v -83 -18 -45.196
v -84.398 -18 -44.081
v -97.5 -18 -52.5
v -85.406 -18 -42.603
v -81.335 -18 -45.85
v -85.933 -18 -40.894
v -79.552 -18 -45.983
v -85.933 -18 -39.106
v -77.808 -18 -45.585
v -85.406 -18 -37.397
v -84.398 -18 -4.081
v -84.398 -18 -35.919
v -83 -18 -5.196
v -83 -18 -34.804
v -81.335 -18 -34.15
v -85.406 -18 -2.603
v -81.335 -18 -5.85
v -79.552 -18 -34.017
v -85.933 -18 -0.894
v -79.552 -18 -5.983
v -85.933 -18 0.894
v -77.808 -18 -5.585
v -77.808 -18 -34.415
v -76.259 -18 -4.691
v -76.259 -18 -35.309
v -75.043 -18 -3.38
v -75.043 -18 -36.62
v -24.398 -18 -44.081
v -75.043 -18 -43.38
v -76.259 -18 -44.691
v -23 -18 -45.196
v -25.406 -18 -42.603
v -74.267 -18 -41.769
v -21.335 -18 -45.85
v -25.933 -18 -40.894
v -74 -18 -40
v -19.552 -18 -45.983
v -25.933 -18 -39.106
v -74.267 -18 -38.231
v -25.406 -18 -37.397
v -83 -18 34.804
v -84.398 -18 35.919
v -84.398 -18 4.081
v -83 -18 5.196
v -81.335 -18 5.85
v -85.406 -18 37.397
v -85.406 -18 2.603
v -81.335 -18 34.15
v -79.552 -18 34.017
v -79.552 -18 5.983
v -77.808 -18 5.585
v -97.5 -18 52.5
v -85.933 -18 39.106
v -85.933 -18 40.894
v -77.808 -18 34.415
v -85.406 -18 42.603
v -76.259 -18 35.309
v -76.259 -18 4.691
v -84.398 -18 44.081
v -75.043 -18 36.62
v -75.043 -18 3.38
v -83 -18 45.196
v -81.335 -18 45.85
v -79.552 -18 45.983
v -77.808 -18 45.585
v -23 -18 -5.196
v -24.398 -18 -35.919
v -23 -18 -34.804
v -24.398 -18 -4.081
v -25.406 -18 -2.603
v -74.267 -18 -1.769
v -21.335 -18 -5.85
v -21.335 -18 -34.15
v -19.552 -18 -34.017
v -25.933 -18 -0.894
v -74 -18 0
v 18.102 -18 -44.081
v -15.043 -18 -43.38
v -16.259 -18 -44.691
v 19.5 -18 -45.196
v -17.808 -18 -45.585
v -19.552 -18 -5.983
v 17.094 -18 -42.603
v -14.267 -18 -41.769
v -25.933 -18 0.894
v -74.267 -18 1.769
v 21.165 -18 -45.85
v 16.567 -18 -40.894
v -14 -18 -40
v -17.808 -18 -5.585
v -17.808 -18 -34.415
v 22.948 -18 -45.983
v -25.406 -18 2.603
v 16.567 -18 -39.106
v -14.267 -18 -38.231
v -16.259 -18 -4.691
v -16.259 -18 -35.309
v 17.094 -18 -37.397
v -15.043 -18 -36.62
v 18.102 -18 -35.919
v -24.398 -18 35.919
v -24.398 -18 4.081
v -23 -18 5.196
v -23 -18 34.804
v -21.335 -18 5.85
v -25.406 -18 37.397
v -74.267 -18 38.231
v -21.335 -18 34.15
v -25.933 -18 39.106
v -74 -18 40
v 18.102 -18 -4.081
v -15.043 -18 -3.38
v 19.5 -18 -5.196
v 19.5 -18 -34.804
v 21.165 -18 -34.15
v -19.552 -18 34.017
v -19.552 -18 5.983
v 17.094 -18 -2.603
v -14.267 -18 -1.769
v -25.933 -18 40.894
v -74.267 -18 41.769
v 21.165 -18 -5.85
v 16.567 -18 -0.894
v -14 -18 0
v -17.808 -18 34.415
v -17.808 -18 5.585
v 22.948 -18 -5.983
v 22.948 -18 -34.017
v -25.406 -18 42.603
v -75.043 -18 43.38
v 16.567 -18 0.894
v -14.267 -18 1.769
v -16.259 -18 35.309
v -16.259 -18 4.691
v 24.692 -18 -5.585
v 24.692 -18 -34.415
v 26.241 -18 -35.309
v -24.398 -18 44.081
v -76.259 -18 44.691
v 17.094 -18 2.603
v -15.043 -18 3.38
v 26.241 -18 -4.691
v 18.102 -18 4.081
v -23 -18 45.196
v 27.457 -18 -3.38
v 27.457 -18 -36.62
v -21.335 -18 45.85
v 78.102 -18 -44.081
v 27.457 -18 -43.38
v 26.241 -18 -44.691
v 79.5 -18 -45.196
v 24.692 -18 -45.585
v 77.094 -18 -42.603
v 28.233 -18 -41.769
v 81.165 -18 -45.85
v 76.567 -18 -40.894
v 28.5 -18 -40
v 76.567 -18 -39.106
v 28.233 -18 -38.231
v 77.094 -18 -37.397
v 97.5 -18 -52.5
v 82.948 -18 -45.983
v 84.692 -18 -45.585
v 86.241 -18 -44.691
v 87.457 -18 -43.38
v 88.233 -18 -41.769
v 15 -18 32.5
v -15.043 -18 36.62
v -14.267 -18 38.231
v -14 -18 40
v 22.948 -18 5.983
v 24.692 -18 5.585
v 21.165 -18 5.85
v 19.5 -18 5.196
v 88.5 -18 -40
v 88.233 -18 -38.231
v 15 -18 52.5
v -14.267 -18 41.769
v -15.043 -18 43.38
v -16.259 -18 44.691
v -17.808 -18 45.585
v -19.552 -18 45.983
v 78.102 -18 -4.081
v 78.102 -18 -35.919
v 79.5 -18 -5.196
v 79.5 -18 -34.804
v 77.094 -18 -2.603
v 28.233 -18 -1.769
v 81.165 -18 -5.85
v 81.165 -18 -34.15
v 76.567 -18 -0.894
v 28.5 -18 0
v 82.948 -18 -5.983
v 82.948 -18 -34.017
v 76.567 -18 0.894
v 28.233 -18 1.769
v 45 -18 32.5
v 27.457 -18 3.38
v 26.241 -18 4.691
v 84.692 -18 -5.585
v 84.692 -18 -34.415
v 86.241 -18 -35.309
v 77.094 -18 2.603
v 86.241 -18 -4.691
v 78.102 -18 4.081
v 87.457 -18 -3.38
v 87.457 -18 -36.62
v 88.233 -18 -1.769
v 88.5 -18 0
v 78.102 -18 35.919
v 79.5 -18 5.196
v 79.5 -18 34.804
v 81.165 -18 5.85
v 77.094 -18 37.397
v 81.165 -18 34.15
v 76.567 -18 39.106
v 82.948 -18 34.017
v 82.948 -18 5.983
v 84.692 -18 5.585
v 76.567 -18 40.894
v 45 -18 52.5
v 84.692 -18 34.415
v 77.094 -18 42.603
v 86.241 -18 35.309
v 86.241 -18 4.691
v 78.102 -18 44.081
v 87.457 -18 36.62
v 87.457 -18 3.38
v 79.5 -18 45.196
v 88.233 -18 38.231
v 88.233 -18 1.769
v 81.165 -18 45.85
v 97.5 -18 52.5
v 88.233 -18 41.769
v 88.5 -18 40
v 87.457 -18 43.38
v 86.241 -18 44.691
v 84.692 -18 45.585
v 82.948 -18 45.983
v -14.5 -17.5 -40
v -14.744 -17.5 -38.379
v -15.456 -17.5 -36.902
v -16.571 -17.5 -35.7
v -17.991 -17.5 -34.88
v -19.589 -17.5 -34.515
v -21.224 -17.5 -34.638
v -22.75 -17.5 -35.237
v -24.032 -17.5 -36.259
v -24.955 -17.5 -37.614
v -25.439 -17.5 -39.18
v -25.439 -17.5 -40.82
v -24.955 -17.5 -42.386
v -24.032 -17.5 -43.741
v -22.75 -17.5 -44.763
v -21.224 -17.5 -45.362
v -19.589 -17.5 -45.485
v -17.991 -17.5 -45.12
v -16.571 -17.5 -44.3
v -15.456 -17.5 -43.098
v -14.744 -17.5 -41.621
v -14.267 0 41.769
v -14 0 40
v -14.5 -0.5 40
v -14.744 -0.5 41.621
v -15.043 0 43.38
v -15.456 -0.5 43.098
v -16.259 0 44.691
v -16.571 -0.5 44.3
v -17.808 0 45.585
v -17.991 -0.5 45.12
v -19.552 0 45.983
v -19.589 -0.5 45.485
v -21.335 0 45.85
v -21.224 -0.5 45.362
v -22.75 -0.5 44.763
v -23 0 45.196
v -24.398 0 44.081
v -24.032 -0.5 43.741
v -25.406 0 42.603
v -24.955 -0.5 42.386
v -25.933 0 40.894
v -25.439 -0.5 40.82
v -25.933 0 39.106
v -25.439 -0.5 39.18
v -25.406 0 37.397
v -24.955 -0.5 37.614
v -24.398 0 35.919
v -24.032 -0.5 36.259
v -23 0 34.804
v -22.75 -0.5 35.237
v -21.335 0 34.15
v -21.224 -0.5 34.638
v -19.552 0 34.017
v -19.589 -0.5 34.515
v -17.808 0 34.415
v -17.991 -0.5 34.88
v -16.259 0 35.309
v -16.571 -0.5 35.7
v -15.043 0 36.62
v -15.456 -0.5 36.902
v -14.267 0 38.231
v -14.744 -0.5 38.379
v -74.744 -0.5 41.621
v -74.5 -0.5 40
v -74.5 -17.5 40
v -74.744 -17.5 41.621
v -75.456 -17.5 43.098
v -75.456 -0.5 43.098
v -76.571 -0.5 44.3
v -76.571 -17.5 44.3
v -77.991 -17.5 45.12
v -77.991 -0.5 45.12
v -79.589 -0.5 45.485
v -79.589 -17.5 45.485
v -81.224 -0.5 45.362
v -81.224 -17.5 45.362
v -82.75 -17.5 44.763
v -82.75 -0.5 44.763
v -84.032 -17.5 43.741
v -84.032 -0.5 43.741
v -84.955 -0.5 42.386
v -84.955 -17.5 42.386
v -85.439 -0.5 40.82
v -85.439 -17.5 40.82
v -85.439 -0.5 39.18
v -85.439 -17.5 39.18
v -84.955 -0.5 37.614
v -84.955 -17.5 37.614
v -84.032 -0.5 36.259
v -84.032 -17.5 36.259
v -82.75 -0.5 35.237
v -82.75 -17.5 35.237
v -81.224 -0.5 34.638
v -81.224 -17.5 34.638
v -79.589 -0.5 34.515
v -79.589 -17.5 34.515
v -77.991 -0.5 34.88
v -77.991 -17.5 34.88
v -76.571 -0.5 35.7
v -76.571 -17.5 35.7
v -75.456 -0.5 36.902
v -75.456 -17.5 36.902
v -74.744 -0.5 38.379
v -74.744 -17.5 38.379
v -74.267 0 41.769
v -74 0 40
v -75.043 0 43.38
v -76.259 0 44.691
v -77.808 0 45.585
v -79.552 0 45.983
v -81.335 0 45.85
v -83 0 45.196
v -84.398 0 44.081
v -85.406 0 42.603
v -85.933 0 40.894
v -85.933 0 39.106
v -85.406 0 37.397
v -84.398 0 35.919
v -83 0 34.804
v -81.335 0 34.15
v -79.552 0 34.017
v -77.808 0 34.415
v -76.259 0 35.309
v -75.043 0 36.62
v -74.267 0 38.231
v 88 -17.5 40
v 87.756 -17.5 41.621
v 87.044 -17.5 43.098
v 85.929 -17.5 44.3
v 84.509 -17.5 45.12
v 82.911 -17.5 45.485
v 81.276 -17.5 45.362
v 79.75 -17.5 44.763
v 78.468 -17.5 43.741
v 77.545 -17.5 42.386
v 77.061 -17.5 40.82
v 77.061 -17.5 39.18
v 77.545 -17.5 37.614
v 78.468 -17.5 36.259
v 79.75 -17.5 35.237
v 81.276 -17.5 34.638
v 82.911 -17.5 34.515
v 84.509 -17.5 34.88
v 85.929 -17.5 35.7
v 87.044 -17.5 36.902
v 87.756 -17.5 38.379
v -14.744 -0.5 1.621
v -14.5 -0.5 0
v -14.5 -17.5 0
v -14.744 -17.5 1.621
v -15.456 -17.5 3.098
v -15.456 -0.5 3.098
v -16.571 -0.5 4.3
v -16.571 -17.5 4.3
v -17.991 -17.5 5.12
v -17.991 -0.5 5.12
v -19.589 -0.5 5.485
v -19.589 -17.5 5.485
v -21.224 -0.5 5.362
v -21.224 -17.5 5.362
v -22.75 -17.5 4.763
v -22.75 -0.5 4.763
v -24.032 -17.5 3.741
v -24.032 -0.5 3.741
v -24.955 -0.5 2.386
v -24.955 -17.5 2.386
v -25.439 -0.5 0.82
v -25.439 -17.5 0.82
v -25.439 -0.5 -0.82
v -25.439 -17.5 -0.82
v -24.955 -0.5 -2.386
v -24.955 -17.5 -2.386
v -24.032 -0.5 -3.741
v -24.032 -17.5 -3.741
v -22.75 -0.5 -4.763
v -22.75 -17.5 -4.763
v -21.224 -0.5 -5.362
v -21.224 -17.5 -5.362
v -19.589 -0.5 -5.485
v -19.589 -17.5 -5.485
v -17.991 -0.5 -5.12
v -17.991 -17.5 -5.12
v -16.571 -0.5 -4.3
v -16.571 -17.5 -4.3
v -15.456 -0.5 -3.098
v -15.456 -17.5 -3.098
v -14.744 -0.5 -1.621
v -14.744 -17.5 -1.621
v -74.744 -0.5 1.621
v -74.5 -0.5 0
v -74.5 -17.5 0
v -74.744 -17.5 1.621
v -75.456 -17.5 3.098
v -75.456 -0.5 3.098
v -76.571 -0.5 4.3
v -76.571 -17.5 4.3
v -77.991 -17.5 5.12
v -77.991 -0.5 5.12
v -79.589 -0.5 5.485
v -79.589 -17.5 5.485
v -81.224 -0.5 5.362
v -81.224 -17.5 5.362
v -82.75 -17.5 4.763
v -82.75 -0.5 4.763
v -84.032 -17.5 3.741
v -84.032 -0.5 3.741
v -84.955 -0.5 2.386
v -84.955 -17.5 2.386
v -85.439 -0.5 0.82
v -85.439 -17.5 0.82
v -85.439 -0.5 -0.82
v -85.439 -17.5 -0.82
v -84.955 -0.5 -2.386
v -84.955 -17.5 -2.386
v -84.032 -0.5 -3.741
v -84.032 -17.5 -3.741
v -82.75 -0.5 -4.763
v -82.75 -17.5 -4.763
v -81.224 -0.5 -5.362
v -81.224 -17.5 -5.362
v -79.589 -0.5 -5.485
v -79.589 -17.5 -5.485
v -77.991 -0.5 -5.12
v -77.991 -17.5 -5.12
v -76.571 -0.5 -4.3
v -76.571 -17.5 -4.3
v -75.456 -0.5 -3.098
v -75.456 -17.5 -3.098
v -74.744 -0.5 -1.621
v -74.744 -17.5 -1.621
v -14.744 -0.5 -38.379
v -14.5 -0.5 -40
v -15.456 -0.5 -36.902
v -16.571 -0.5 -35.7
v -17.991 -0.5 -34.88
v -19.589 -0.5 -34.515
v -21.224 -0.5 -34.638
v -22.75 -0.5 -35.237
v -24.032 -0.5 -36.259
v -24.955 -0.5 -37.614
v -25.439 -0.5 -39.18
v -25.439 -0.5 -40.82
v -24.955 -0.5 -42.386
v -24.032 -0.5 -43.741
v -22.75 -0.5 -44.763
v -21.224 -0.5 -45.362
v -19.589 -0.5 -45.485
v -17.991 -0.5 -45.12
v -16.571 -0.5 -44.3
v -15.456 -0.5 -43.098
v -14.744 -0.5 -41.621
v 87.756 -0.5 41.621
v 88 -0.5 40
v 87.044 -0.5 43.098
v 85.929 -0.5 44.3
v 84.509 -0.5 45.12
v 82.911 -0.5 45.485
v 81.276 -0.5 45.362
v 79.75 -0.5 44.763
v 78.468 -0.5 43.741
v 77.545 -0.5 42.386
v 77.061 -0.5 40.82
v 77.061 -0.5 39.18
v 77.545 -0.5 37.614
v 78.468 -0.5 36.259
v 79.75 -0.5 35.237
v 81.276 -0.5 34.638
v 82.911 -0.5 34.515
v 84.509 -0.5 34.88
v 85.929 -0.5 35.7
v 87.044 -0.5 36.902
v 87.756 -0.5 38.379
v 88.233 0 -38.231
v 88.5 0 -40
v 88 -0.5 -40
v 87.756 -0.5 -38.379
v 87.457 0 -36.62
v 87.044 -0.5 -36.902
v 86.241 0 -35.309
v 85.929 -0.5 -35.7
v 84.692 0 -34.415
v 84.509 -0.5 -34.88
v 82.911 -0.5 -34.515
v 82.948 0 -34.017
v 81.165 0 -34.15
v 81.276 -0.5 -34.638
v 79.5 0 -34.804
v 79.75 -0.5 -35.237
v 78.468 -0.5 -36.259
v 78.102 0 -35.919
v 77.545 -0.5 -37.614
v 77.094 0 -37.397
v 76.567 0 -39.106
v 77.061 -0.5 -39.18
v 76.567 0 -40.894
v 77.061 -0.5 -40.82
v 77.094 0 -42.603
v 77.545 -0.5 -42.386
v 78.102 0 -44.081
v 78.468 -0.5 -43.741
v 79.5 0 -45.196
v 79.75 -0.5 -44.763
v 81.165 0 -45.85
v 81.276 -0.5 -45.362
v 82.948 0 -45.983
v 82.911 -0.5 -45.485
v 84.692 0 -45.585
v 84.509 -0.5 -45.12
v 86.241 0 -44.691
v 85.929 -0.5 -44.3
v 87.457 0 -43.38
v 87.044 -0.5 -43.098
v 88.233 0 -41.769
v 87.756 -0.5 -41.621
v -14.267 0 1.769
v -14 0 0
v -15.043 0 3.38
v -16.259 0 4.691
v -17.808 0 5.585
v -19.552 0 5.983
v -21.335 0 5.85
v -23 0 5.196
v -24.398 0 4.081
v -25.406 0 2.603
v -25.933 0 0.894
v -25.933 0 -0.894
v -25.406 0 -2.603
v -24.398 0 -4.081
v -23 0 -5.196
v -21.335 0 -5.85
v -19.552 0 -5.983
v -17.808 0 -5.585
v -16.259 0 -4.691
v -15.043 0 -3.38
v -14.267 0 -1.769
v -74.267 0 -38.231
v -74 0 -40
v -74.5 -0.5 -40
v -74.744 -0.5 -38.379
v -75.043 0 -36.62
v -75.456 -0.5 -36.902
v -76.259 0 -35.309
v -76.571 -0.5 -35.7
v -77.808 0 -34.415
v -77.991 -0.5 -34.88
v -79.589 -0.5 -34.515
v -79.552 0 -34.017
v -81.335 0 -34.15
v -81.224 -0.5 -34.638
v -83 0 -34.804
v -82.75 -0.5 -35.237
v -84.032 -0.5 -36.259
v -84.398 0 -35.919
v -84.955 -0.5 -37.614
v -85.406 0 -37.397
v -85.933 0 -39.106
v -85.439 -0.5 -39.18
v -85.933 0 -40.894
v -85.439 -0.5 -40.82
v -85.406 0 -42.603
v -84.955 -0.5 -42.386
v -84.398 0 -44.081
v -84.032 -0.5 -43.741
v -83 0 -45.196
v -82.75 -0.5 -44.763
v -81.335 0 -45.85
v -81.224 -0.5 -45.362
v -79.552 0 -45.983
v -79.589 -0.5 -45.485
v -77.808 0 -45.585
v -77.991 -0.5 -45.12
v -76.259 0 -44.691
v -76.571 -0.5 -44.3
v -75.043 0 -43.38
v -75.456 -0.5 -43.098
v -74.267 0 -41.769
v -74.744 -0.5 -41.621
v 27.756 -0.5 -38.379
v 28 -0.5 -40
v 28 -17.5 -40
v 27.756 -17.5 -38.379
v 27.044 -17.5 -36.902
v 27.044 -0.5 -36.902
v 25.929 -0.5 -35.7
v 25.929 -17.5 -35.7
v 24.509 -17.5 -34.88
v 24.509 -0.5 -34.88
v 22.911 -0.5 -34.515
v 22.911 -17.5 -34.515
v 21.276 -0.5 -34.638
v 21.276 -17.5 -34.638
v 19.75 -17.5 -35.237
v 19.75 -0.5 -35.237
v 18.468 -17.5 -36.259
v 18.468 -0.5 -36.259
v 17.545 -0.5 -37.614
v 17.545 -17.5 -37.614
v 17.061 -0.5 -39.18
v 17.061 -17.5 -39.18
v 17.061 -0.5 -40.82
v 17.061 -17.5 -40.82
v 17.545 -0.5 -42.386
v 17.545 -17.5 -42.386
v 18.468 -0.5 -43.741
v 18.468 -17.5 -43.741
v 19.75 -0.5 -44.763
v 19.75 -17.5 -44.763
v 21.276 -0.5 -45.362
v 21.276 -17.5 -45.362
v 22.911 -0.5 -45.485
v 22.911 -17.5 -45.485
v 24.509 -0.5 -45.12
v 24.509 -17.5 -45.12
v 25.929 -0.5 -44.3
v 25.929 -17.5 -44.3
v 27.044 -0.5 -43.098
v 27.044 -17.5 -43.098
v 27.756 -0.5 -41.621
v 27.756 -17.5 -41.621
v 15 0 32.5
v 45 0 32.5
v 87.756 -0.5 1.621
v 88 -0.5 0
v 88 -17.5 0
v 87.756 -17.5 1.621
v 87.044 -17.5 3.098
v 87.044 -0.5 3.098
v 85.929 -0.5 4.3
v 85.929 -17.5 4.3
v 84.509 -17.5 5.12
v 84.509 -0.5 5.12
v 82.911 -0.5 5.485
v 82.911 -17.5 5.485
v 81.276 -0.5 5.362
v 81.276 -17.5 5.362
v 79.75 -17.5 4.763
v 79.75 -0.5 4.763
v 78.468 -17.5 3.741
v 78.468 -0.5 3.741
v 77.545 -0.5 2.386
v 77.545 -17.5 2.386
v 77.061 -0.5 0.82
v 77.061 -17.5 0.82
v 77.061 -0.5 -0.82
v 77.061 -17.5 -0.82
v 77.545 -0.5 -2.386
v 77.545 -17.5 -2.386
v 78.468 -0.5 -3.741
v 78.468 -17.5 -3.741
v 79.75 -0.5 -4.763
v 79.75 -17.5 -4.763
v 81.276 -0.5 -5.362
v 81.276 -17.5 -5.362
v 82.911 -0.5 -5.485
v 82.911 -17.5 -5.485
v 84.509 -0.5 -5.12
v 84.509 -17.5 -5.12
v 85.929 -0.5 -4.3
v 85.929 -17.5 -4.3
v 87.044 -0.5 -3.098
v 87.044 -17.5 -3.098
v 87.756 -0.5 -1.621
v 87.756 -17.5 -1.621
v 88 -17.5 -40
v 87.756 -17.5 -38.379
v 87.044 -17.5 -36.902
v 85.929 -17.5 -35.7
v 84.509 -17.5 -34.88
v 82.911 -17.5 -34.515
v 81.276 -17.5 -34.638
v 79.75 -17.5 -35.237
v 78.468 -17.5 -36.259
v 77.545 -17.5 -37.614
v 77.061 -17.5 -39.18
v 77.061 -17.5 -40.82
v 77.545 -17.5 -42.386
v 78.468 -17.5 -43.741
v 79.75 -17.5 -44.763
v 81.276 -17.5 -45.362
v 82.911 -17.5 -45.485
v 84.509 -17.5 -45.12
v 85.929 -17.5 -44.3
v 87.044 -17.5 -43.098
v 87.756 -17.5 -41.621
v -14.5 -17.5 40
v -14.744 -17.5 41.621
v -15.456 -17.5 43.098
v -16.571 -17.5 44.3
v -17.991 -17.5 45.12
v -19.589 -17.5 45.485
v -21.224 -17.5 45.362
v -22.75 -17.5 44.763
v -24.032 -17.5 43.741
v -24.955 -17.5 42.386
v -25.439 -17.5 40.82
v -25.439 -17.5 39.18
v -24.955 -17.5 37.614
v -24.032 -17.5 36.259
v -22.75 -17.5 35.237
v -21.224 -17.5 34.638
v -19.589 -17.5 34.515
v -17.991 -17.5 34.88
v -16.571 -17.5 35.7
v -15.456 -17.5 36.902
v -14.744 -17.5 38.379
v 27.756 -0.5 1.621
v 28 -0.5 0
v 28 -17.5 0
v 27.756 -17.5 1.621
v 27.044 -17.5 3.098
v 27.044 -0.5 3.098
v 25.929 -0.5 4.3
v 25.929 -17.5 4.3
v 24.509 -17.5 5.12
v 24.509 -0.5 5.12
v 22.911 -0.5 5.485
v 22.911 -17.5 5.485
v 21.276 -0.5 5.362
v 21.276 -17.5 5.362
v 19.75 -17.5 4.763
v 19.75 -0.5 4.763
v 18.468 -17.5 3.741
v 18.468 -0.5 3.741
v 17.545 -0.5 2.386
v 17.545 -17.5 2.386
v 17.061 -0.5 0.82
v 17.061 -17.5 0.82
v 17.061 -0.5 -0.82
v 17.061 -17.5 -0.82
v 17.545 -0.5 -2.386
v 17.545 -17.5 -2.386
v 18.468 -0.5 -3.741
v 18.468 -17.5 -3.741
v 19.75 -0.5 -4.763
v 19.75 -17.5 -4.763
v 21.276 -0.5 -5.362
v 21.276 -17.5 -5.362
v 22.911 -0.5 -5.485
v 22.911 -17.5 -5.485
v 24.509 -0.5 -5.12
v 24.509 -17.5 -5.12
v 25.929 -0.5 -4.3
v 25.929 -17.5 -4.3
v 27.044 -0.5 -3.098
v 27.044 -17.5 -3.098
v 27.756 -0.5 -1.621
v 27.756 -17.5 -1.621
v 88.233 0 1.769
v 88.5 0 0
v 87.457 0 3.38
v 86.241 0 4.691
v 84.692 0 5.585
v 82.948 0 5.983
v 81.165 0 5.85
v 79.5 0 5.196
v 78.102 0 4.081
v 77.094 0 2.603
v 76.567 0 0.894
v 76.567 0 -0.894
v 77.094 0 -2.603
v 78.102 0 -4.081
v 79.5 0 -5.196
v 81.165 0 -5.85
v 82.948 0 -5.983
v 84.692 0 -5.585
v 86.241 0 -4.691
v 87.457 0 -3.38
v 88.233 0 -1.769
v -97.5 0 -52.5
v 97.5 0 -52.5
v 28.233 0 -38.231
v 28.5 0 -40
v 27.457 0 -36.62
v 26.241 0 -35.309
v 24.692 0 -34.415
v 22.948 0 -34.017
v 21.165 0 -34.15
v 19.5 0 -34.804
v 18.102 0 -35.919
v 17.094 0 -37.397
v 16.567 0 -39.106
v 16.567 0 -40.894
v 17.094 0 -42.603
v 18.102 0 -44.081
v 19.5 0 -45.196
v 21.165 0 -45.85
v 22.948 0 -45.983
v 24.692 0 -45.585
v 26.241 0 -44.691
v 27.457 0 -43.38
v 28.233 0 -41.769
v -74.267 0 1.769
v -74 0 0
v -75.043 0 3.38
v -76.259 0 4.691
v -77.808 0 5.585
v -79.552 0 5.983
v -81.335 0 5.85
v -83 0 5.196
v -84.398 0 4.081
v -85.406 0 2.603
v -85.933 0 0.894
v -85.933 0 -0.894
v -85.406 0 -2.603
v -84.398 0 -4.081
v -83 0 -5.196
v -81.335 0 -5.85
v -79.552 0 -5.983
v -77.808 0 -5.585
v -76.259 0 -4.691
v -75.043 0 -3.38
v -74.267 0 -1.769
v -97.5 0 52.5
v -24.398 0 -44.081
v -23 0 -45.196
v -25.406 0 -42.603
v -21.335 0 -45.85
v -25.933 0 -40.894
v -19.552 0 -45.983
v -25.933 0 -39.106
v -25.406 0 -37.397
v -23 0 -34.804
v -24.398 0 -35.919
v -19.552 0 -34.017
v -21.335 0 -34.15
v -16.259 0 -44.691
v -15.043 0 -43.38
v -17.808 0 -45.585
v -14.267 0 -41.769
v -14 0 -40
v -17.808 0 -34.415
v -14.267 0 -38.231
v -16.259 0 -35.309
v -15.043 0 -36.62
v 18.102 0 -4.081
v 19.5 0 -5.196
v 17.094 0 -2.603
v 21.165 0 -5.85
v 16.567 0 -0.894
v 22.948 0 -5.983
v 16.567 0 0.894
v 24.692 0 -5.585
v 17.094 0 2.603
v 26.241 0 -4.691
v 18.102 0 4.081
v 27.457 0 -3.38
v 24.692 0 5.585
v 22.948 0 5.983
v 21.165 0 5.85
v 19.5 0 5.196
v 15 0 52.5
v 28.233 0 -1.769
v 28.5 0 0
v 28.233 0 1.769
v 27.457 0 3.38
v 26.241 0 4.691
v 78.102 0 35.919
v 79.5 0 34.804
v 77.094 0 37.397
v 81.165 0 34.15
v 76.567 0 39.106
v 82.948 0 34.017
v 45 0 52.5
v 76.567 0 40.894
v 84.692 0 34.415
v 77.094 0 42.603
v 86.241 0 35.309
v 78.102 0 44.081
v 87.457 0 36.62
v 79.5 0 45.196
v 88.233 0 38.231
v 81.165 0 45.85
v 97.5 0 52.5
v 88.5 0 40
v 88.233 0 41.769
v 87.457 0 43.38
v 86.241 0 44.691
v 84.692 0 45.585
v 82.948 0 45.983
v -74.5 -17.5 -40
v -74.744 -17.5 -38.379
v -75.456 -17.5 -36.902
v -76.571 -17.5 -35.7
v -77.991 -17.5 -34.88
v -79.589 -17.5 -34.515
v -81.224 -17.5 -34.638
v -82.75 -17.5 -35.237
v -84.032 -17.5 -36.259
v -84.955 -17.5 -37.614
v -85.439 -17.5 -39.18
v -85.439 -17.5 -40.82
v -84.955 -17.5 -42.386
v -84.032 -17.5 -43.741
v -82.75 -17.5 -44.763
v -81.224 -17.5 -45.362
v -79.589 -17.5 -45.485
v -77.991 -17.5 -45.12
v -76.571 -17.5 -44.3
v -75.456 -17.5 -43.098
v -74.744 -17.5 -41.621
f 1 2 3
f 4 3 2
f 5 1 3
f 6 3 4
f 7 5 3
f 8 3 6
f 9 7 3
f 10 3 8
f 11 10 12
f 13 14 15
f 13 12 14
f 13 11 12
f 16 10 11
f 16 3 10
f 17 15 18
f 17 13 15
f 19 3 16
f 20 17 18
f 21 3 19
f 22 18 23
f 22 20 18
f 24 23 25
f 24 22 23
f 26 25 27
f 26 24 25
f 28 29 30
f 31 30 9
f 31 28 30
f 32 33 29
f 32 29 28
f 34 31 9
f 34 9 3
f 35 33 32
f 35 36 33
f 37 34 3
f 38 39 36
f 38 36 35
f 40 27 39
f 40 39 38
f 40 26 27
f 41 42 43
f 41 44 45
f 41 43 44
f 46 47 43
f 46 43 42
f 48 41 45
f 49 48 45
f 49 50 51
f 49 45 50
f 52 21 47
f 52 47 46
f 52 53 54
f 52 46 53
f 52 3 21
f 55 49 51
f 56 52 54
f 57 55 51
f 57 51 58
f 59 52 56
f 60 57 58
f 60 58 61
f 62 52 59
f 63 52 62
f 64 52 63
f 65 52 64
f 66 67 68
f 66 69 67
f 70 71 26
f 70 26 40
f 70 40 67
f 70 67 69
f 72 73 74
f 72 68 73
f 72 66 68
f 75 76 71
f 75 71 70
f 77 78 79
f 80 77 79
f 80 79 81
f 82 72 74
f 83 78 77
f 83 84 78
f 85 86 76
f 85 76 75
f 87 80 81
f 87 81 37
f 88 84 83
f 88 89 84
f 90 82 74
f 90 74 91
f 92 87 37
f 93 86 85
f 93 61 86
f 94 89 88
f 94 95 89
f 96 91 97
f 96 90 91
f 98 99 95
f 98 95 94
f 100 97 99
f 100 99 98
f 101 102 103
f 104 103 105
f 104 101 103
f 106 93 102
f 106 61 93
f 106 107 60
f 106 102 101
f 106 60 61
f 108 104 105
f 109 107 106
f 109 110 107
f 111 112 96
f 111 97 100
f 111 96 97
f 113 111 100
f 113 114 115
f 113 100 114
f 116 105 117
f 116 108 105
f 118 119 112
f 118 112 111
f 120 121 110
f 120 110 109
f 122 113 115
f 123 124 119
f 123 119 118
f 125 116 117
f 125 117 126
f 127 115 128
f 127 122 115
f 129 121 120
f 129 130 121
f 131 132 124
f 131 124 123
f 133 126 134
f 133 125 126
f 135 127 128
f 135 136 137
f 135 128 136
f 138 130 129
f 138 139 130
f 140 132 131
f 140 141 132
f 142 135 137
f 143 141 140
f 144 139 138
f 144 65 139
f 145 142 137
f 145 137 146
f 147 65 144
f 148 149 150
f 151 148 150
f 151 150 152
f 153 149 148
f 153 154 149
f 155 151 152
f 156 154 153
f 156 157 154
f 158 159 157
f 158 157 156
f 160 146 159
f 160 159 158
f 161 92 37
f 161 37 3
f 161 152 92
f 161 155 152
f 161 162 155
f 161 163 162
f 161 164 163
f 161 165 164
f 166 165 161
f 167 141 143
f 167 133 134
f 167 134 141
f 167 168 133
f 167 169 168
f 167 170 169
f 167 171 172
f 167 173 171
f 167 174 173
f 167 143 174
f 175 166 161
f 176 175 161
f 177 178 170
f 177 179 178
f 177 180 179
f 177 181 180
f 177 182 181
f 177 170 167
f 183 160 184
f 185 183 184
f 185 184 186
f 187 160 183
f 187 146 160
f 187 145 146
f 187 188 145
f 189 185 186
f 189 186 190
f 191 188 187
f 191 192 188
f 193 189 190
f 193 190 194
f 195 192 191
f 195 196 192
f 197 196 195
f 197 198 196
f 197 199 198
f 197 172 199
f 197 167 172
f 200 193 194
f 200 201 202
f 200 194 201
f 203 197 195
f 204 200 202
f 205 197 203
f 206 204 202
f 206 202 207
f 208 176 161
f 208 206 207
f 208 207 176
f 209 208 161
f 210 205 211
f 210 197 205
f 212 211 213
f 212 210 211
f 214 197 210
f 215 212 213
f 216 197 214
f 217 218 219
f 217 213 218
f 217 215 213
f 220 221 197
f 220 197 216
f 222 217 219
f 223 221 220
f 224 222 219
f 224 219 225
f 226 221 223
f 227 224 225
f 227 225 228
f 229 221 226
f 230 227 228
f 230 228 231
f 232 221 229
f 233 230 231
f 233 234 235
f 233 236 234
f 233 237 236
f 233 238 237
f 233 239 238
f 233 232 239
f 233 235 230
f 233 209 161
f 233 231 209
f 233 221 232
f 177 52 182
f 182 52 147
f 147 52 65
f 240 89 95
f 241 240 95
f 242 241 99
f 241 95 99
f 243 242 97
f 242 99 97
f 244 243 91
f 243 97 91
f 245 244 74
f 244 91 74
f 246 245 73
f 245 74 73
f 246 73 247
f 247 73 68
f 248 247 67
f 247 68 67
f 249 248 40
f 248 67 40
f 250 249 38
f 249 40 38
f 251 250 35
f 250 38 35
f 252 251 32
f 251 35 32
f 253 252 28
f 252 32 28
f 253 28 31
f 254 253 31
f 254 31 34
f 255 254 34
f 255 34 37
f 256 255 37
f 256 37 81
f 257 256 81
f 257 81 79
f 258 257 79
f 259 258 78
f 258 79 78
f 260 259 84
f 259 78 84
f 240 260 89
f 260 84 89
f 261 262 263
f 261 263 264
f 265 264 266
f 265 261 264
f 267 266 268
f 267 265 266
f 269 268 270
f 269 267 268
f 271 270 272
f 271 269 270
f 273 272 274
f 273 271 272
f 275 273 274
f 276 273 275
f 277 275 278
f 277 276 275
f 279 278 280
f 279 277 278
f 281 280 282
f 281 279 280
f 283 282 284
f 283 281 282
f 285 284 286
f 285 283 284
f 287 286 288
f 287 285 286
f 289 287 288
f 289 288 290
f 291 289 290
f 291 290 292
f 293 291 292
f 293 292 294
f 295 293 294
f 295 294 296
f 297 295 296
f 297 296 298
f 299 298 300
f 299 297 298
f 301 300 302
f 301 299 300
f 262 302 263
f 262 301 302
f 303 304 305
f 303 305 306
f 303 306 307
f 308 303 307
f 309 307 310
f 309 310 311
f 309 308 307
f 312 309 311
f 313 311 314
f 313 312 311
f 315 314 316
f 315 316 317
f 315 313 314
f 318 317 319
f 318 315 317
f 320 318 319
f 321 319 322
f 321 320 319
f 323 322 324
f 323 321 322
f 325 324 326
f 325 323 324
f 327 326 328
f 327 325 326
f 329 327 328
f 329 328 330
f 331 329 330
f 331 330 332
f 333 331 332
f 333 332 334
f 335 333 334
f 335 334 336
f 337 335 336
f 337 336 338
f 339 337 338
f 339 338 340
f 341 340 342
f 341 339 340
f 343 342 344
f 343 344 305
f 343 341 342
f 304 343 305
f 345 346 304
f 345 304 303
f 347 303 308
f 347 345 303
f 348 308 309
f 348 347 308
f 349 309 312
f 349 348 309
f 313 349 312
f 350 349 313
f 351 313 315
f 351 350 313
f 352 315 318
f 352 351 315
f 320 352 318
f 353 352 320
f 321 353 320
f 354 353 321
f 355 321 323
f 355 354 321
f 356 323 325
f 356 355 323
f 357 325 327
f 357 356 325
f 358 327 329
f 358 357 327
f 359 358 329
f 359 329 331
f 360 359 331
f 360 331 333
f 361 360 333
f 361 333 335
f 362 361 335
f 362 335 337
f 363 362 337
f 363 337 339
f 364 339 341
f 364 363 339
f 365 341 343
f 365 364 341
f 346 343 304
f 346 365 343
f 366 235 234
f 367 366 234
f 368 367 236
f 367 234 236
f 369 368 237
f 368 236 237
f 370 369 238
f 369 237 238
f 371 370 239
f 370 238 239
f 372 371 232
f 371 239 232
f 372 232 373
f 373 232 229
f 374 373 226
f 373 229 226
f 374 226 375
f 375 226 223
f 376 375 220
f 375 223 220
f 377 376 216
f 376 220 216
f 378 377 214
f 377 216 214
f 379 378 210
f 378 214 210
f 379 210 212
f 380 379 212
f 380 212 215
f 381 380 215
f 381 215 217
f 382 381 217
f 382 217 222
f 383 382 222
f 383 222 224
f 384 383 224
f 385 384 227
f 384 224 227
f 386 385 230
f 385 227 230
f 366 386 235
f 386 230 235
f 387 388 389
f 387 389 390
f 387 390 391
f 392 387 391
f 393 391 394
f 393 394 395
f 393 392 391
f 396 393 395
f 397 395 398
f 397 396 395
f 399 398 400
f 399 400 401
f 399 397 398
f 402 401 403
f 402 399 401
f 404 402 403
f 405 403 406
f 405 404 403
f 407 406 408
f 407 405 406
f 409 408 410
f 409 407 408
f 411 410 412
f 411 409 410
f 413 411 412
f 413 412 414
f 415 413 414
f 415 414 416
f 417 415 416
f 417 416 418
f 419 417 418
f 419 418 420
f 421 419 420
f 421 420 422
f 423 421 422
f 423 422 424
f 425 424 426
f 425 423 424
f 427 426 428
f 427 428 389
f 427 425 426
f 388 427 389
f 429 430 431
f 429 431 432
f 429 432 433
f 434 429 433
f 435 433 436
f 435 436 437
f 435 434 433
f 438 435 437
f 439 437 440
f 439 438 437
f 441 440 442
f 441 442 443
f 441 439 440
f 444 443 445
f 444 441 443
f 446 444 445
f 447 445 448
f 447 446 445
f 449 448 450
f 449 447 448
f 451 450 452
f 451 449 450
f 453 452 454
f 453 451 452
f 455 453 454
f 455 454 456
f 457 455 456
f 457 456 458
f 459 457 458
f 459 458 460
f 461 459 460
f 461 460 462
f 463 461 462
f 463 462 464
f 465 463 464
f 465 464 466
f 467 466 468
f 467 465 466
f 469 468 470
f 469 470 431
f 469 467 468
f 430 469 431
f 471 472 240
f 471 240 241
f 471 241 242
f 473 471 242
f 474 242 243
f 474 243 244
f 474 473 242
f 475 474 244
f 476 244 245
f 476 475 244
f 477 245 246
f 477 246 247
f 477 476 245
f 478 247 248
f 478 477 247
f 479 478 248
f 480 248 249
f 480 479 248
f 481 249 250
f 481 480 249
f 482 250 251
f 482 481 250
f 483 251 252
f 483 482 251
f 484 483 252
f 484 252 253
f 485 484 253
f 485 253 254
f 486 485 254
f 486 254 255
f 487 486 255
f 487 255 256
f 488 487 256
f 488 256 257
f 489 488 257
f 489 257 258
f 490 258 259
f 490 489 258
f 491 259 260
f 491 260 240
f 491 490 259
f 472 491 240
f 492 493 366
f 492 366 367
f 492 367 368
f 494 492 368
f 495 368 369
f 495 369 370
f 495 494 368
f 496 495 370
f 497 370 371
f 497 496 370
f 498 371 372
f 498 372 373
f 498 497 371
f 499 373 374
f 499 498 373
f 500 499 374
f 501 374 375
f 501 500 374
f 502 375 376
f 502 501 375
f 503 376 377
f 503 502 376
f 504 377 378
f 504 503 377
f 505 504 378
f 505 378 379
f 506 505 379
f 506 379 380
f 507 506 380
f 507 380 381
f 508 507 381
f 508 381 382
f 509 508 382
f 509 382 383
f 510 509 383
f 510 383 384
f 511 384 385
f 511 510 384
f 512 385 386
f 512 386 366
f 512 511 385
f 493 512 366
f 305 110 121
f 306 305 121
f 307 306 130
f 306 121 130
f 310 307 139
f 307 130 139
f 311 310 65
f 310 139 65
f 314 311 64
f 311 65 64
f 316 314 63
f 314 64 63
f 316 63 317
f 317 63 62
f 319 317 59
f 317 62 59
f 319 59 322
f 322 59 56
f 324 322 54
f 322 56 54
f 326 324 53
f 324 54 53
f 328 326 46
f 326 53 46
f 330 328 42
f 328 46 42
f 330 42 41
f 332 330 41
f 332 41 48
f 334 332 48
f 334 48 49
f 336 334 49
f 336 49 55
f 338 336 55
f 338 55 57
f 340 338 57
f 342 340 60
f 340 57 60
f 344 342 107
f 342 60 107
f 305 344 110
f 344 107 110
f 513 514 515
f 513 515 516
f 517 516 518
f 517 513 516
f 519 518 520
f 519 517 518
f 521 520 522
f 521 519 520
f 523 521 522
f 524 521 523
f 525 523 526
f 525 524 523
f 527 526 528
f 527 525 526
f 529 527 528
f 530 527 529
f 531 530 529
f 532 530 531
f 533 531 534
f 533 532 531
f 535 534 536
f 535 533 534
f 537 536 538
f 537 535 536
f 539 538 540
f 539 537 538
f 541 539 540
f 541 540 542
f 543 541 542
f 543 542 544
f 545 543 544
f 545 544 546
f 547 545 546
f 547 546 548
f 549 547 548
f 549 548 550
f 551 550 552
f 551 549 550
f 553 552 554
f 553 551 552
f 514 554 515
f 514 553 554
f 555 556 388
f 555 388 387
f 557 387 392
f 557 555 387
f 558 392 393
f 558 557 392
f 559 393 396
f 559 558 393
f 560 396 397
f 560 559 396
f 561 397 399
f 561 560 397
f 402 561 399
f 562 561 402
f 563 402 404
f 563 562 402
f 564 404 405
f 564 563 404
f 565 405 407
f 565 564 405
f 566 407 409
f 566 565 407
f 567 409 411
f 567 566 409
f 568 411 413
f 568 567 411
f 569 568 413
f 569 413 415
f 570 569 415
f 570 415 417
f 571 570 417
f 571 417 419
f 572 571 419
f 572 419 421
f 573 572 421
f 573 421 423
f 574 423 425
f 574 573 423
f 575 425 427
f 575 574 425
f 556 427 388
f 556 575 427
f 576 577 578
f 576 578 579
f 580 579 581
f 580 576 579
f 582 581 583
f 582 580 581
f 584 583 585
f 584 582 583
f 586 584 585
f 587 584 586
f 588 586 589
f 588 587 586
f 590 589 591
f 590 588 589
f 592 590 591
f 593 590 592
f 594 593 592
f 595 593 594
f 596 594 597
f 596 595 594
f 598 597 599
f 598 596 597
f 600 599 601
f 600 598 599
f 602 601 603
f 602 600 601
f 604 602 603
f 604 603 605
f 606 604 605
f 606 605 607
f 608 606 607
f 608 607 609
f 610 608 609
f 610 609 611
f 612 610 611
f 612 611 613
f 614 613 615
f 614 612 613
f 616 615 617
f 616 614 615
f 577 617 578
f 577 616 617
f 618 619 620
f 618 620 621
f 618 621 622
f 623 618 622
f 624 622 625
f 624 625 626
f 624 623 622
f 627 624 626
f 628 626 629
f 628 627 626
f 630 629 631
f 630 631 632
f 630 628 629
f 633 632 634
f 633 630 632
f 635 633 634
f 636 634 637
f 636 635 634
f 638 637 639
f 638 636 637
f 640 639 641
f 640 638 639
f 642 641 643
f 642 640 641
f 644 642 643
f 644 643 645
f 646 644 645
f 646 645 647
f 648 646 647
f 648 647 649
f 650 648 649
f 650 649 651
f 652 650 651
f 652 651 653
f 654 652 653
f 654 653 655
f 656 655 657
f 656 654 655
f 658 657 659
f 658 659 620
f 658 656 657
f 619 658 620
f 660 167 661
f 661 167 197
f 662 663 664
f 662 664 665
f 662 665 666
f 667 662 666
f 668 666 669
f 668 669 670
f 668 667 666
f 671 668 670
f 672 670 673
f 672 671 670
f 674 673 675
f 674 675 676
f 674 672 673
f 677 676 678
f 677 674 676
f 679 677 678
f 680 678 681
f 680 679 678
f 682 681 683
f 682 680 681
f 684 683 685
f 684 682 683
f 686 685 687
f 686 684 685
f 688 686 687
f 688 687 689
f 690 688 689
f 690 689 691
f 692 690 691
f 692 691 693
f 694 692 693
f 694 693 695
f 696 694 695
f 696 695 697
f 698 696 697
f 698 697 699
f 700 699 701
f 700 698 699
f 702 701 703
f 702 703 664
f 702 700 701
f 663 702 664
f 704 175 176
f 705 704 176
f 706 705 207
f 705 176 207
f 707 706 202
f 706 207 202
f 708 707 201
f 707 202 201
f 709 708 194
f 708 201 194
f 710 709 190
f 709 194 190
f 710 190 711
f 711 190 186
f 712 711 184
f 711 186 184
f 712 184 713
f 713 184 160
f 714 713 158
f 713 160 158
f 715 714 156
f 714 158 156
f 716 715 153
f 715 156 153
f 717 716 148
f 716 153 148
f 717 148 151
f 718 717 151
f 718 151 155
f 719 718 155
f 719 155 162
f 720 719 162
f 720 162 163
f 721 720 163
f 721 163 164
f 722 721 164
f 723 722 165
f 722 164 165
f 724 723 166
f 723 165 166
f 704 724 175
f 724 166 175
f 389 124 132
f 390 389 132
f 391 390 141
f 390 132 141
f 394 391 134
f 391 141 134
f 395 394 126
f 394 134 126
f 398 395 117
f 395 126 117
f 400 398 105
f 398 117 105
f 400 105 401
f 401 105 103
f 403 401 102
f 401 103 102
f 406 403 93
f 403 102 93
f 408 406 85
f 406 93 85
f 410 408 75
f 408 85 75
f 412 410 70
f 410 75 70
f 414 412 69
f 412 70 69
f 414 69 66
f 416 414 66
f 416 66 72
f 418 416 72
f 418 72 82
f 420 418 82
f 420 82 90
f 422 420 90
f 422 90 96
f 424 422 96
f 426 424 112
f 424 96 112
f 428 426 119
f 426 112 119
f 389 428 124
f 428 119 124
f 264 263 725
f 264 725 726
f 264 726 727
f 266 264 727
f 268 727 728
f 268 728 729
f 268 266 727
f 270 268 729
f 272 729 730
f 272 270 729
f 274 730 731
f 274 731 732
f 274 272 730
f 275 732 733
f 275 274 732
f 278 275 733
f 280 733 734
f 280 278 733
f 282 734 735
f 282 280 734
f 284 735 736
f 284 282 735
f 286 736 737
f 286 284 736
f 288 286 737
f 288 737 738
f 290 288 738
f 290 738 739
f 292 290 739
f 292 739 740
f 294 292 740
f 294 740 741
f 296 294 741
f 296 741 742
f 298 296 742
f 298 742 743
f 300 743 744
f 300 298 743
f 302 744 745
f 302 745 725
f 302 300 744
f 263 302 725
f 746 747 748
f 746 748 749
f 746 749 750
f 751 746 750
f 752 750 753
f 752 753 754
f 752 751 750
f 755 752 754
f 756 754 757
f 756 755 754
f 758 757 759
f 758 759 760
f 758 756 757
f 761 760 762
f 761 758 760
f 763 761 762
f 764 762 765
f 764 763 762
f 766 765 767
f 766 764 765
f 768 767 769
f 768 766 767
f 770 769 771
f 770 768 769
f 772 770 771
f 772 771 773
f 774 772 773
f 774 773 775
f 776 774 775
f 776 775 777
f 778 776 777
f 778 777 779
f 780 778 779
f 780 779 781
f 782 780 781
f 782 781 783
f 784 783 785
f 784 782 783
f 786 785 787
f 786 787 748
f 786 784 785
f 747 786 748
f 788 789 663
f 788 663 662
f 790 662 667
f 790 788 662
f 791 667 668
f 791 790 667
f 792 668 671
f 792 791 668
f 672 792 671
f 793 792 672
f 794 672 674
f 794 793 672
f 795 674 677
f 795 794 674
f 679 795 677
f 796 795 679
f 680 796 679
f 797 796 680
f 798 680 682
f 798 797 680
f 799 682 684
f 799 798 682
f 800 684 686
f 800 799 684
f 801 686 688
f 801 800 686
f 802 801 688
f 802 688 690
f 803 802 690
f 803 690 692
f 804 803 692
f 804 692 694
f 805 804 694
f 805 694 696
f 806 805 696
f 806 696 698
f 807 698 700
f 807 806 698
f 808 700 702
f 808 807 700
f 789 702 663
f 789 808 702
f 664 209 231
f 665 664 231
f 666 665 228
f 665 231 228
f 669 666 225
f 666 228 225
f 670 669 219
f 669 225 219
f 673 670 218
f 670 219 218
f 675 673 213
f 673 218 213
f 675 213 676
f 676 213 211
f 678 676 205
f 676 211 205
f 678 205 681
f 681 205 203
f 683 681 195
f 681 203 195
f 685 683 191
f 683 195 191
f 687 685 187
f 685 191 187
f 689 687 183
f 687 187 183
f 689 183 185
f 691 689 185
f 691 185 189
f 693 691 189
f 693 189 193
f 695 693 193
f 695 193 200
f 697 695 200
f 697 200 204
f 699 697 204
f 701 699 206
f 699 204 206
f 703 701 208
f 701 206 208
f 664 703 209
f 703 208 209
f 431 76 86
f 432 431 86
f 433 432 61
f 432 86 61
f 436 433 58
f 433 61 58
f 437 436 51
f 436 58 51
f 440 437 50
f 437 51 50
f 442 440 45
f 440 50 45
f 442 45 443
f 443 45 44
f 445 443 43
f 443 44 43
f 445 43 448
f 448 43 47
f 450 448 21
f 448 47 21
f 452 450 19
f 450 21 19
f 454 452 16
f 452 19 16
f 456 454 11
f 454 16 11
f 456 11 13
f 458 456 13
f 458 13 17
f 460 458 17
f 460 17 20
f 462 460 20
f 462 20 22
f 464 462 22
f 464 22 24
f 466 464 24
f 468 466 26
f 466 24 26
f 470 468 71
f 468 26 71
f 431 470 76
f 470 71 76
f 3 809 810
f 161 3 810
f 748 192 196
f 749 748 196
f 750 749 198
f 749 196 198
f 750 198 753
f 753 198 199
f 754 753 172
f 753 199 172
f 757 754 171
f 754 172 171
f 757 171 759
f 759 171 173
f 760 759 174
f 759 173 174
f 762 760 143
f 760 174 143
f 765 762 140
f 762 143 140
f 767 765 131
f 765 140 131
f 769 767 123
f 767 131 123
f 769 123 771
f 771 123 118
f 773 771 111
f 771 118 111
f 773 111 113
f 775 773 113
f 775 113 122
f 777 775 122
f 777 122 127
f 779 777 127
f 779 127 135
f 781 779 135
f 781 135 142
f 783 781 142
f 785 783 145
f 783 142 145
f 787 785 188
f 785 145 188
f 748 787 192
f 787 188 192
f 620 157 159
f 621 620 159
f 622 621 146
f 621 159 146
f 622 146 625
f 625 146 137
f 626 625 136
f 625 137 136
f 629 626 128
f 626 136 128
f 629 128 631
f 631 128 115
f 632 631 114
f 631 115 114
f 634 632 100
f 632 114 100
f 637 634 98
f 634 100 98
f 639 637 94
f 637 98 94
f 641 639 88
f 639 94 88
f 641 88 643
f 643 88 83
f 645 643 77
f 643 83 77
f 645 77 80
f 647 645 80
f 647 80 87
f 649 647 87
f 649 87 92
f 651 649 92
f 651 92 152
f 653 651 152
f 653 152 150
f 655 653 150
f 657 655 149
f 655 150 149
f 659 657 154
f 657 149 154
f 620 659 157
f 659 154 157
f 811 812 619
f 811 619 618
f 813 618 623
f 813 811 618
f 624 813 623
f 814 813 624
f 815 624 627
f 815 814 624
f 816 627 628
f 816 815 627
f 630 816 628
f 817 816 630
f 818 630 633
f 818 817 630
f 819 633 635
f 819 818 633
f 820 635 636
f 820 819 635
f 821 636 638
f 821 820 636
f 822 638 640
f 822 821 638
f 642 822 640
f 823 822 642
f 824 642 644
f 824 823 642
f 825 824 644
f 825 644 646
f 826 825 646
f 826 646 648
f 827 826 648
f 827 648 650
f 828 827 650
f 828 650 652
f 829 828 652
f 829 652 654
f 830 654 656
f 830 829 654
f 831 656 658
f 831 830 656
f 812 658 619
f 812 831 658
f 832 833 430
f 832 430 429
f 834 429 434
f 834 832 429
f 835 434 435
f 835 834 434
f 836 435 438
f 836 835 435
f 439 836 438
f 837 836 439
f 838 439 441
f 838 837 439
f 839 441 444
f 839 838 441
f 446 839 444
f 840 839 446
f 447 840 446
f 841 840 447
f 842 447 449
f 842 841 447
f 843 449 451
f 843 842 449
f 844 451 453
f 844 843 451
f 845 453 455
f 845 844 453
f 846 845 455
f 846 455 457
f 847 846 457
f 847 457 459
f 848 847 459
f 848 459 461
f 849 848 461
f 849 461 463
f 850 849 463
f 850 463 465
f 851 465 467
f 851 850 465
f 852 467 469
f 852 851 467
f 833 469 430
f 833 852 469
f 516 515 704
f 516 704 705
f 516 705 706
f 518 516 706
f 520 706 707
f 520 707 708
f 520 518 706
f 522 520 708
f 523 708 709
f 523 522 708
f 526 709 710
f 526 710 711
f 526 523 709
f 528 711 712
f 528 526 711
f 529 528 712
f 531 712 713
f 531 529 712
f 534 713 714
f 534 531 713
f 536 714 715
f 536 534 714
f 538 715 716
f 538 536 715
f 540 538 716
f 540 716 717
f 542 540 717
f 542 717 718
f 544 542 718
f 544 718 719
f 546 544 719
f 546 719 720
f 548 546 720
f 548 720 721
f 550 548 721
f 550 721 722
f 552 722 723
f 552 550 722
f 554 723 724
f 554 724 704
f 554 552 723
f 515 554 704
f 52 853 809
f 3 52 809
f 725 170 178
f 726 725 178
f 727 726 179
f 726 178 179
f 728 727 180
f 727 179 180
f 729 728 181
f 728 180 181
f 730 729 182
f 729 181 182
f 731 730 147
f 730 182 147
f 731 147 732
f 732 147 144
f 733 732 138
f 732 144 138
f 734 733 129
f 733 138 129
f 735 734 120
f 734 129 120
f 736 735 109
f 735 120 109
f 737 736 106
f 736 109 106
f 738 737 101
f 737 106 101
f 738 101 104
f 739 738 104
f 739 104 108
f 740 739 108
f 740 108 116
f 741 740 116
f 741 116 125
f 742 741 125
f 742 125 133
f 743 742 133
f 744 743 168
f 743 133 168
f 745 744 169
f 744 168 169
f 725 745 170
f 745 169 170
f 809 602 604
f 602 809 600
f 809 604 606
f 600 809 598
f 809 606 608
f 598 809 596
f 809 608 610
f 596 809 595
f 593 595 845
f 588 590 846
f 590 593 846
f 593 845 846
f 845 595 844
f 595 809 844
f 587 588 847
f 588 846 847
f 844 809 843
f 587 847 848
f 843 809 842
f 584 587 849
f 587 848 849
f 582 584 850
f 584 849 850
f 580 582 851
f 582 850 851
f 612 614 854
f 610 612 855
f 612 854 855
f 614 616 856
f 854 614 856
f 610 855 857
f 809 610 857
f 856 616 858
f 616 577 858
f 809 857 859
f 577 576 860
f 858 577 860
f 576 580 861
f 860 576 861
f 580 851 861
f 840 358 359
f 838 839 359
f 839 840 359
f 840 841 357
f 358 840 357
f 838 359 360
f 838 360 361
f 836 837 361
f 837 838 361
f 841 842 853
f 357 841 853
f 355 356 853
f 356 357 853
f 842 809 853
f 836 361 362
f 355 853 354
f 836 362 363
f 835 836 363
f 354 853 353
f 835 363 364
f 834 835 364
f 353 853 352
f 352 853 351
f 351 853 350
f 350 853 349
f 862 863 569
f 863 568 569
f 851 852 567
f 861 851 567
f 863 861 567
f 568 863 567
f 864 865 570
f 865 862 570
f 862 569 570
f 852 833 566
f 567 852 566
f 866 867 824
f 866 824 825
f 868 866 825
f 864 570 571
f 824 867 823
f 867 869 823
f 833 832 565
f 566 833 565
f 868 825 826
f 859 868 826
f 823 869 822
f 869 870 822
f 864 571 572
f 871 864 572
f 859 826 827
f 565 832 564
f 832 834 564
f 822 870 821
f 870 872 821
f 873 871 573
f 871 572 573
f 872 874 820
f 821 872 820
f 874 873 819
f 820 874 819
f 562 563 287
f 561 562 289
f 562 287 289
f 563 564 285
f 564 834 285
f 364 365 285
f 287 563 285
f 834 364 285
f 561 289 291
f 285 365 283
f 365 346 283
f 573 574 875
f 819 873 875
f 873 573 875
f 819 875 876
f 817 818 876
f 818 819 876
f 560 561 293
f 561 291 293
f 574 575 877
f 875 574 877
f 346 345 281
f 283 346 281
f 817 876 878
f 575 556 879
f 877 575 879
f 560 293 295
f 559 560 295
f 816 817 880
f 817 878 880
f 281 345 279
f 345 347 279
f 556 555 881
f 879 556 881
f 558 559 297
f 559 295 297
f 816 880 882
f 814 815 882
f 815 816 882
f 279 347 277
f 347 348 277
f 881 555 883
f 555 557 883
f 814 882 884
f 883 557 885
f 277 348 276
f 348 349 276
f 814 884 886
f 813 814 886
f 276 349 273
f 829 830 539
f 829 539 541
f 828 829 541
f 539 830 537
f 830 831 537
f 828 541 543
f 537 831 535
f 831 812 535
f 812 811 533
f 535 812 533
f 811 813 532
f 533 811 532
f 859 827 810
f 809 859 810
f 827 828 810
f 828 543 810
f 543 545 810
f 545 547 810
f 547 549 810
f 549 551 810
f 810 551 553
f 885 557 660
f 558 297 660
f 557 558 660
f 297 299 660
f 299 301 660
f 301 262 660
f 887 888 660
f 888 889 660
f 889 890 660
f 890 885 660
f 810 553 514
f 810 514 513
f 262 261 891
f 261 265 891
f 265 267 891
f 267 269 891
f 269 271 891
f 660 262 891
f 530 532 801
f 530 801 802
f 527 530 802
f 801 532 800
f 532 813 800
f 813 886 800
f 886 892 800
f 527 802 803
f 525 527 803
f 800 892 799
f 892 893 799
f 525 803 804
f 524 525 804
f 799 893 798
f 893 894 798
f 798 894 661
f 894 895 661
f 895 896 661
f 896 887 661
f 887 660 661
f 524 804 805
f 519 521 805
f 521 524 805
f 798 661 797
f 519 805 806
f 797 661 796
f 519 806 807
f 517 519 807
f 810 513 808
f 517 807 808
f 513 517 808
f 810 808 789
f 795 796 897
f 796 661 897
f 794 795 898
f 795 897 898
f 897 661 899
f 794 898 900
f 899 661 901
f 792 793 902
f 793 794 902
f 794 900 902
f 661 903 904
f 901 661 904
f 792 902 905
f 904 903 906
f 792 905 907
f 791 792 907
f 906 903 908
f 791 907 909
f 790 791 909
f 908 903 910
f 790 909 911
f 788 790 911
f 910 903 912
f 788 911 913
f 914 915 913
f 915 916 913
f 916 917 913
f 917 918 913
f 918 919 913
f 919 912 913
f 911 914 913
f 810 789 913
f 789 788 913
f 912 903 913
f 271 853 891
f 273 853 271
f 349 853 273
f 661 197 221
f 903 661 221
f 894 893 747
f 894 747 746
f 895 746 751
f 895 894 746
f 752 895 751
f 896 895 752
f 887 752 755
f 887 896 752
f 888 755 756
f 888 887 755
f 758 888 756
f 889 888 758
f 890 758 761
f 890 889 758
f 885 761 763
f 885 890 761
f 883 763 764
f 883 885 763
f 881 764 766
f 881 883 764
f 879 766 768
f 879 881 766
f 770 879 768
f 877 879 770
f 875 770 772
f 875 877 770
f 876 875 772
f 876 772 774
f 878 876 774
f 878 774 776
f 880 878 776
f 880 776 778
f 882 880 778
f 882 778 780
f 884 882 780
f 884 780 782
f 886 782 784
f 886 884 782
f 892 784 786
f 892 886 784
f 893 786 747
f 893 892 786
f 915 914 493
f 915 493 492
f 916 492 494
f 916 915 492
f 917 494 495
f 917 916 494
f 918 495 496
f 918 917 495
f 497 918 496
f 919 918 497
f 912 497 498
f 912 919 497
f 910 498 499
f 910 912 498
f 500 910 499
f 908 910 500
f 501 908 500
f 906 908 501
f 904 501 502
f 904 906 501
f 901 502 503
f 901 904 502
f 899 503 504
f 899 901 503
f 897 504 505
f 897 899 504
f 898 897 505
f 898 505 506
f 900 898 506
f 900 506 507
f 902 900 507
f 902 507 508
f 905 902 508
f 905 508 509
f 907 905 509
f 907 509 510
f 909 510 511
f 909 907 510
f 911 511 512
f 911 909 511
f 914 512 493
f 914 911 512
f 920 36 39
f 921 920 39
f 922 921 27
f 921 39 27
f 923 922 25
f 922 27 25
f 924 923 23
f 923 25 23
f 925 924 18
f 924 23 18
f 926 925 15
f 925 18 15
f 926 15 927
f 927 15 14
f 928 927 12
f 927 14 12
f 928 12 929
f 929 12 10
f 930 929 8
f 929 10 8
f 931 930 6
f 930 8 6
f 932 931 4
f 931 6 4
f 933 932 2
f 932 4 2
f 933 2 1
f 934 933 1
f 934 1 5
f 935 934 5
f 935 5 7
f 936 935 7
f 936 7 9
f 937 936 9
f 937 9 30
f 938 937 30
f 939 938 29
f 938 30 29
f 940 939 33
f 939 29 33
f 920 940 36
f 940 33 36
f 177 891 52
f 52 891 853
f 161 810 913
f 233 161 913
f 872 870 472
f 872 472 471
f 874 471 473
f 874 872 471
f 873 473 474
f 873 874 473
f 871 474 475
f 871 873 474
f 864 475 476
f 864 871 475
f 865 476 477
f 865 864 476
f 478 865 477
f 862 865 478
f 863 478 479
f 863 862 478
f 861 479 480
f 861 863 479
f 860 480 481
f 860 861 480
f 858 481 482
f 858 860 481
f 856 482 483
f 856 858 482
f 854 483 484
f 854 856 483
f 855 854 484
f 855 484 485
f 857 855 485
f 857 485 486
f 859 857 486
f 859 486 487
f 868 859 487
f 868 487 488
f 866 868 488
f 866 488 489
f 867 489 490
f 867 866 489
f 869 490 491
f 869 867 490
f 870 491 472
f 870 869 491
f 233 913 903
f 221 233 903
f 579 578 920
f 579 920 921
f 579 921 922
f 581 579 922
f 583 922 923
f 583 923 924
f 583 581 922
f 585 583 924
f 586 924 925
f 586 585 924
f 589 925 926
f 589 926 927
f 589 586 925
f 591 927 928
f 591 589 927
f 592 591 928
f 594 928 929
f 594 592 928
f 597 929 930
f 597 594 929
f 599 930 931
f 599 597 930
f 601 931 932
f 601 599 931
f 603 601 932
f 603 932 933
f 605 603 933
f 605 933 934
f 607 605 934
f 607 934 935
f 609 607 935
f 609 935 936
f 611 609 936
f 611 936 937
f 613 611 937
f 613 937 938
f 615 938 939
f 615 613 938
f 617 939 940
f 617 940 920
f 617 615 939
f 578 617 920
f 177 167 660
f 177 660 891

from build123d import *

# Parameters (mm, degrees)
F0_R     = 5.5
F0_W     = 30
F0_H     = 59.6731263399
F0_H_2   = 20
F1_DEPTH = 18
F2_SIZE  = 0.5
F3_W     = 30
F3_H     = 79.6731263399
F4_DEPTH = 25


with BuildPart() as f1:
    # F0 (on Front) → F1 (new body)
    with BuildSketch(Plane.XZ):
        Polygon((-97.5, 52.5), (-97.5, -52.5), (97.5, -52.5), (97.5, 52.5), (45, 52.5), (45, 32.5), (15, 32.5), (15, 52.5), align=None)
        with Locations((-80, -40)):
            Circle(F0_R, mode=Mode.SUBTRACT)
        with Locations((-20, -40)):
            Circle(F0_R, mode=Mode.SUBTRACT)
        with Locations((-80, 0)):
            Circle(F0_R, mode=Mode.SUBTRACT)
        with Locations((-20, 0)):
            Circle(F0_R, mode=Mode.SUBTRACT)
        with Locations((22.5, -40)):
            Circle(F0_R, mode=Mode.SUBTRACT)
        with Locations((82.5, -40)):
            Circle(F0_R, mode=Mode.SUBTRACT)
        with Locations((22.5, 0)):
            Circle(F0_R, mode=Mode.SUBTRACT)
        with Locations((82.5, 0)):
            Circle(F0_R, mode=Mode.SUBTRACT)
        with Locations((-80, 40)):
            Circle(F0_R, mode=Mode.SUBTRACT)
        with Locations((-20, 40)):
            Circle(F0_R, mode=Mode.SUBTRACT)
        with Locations((82.5, 40)):
            Circle(F0_R, mode=Mode.SUBTRACT)
        with Locations((30, 82.33656317)):
            Rectangle(F0_W, F0_H)
        with Locations((30, 42.5)):
            Rectangle(F0_W, F0_H_2)
    extrude(amount=F1_DEPTH)

    # F2
    f2_edges = [f1.edges().sort_by_distance(p)[0] for p in [
        (-74.5, -9, 40),
        (-85.5, 0, 40),
        (-85.5, -18, 40),
        (-74.5, -9, 0),
        (-85.5, 0, 0),
        (-85.5, -18, 0),
        (-74.5, -9, -40),
        (-85.5, 0, -40),
        (-85.5, -18, -40),
        (-14.5, -9, 40),
        (-25.5, 0, 40),
        (-25.5, -18, 40),
        (-14.5, -9, 0),
        (-25.5, 0, 0),
        (-25.5, -18, 0),
        (-14.5, -9, -40),
        (-25.5, 0, -40),
        (-25.5, -18, -40),
        (28, -9, 0),
        (17, 0, 0),
        (17, -18, 0),
        (28, -9, -40),
        (17, 0, -40),
        (17, -18, -40),
        (88, -9, 40),
        (77, 0, 40),
        (77, -18, 40),
        (88, -9, 0),
        (77, 0, 0),
        (77, -18, 0),
        (88, -9, -40),
        (77, 0, -40),
        (77, -18, -40),
    ]]
    chamfer(f2_edges, length=F2_SIZE)

    # F3 (on face) → F4 (cut)
    with BuildSketch(Plane.XZ.offset(18)):
        with Locations((30, 72.33656317)):
            Rectangle(F3_W, F3_H)
    extrude(amount=-F4_DEPTH, mode=Mode.SUBTRACT)


solid = f1.part
